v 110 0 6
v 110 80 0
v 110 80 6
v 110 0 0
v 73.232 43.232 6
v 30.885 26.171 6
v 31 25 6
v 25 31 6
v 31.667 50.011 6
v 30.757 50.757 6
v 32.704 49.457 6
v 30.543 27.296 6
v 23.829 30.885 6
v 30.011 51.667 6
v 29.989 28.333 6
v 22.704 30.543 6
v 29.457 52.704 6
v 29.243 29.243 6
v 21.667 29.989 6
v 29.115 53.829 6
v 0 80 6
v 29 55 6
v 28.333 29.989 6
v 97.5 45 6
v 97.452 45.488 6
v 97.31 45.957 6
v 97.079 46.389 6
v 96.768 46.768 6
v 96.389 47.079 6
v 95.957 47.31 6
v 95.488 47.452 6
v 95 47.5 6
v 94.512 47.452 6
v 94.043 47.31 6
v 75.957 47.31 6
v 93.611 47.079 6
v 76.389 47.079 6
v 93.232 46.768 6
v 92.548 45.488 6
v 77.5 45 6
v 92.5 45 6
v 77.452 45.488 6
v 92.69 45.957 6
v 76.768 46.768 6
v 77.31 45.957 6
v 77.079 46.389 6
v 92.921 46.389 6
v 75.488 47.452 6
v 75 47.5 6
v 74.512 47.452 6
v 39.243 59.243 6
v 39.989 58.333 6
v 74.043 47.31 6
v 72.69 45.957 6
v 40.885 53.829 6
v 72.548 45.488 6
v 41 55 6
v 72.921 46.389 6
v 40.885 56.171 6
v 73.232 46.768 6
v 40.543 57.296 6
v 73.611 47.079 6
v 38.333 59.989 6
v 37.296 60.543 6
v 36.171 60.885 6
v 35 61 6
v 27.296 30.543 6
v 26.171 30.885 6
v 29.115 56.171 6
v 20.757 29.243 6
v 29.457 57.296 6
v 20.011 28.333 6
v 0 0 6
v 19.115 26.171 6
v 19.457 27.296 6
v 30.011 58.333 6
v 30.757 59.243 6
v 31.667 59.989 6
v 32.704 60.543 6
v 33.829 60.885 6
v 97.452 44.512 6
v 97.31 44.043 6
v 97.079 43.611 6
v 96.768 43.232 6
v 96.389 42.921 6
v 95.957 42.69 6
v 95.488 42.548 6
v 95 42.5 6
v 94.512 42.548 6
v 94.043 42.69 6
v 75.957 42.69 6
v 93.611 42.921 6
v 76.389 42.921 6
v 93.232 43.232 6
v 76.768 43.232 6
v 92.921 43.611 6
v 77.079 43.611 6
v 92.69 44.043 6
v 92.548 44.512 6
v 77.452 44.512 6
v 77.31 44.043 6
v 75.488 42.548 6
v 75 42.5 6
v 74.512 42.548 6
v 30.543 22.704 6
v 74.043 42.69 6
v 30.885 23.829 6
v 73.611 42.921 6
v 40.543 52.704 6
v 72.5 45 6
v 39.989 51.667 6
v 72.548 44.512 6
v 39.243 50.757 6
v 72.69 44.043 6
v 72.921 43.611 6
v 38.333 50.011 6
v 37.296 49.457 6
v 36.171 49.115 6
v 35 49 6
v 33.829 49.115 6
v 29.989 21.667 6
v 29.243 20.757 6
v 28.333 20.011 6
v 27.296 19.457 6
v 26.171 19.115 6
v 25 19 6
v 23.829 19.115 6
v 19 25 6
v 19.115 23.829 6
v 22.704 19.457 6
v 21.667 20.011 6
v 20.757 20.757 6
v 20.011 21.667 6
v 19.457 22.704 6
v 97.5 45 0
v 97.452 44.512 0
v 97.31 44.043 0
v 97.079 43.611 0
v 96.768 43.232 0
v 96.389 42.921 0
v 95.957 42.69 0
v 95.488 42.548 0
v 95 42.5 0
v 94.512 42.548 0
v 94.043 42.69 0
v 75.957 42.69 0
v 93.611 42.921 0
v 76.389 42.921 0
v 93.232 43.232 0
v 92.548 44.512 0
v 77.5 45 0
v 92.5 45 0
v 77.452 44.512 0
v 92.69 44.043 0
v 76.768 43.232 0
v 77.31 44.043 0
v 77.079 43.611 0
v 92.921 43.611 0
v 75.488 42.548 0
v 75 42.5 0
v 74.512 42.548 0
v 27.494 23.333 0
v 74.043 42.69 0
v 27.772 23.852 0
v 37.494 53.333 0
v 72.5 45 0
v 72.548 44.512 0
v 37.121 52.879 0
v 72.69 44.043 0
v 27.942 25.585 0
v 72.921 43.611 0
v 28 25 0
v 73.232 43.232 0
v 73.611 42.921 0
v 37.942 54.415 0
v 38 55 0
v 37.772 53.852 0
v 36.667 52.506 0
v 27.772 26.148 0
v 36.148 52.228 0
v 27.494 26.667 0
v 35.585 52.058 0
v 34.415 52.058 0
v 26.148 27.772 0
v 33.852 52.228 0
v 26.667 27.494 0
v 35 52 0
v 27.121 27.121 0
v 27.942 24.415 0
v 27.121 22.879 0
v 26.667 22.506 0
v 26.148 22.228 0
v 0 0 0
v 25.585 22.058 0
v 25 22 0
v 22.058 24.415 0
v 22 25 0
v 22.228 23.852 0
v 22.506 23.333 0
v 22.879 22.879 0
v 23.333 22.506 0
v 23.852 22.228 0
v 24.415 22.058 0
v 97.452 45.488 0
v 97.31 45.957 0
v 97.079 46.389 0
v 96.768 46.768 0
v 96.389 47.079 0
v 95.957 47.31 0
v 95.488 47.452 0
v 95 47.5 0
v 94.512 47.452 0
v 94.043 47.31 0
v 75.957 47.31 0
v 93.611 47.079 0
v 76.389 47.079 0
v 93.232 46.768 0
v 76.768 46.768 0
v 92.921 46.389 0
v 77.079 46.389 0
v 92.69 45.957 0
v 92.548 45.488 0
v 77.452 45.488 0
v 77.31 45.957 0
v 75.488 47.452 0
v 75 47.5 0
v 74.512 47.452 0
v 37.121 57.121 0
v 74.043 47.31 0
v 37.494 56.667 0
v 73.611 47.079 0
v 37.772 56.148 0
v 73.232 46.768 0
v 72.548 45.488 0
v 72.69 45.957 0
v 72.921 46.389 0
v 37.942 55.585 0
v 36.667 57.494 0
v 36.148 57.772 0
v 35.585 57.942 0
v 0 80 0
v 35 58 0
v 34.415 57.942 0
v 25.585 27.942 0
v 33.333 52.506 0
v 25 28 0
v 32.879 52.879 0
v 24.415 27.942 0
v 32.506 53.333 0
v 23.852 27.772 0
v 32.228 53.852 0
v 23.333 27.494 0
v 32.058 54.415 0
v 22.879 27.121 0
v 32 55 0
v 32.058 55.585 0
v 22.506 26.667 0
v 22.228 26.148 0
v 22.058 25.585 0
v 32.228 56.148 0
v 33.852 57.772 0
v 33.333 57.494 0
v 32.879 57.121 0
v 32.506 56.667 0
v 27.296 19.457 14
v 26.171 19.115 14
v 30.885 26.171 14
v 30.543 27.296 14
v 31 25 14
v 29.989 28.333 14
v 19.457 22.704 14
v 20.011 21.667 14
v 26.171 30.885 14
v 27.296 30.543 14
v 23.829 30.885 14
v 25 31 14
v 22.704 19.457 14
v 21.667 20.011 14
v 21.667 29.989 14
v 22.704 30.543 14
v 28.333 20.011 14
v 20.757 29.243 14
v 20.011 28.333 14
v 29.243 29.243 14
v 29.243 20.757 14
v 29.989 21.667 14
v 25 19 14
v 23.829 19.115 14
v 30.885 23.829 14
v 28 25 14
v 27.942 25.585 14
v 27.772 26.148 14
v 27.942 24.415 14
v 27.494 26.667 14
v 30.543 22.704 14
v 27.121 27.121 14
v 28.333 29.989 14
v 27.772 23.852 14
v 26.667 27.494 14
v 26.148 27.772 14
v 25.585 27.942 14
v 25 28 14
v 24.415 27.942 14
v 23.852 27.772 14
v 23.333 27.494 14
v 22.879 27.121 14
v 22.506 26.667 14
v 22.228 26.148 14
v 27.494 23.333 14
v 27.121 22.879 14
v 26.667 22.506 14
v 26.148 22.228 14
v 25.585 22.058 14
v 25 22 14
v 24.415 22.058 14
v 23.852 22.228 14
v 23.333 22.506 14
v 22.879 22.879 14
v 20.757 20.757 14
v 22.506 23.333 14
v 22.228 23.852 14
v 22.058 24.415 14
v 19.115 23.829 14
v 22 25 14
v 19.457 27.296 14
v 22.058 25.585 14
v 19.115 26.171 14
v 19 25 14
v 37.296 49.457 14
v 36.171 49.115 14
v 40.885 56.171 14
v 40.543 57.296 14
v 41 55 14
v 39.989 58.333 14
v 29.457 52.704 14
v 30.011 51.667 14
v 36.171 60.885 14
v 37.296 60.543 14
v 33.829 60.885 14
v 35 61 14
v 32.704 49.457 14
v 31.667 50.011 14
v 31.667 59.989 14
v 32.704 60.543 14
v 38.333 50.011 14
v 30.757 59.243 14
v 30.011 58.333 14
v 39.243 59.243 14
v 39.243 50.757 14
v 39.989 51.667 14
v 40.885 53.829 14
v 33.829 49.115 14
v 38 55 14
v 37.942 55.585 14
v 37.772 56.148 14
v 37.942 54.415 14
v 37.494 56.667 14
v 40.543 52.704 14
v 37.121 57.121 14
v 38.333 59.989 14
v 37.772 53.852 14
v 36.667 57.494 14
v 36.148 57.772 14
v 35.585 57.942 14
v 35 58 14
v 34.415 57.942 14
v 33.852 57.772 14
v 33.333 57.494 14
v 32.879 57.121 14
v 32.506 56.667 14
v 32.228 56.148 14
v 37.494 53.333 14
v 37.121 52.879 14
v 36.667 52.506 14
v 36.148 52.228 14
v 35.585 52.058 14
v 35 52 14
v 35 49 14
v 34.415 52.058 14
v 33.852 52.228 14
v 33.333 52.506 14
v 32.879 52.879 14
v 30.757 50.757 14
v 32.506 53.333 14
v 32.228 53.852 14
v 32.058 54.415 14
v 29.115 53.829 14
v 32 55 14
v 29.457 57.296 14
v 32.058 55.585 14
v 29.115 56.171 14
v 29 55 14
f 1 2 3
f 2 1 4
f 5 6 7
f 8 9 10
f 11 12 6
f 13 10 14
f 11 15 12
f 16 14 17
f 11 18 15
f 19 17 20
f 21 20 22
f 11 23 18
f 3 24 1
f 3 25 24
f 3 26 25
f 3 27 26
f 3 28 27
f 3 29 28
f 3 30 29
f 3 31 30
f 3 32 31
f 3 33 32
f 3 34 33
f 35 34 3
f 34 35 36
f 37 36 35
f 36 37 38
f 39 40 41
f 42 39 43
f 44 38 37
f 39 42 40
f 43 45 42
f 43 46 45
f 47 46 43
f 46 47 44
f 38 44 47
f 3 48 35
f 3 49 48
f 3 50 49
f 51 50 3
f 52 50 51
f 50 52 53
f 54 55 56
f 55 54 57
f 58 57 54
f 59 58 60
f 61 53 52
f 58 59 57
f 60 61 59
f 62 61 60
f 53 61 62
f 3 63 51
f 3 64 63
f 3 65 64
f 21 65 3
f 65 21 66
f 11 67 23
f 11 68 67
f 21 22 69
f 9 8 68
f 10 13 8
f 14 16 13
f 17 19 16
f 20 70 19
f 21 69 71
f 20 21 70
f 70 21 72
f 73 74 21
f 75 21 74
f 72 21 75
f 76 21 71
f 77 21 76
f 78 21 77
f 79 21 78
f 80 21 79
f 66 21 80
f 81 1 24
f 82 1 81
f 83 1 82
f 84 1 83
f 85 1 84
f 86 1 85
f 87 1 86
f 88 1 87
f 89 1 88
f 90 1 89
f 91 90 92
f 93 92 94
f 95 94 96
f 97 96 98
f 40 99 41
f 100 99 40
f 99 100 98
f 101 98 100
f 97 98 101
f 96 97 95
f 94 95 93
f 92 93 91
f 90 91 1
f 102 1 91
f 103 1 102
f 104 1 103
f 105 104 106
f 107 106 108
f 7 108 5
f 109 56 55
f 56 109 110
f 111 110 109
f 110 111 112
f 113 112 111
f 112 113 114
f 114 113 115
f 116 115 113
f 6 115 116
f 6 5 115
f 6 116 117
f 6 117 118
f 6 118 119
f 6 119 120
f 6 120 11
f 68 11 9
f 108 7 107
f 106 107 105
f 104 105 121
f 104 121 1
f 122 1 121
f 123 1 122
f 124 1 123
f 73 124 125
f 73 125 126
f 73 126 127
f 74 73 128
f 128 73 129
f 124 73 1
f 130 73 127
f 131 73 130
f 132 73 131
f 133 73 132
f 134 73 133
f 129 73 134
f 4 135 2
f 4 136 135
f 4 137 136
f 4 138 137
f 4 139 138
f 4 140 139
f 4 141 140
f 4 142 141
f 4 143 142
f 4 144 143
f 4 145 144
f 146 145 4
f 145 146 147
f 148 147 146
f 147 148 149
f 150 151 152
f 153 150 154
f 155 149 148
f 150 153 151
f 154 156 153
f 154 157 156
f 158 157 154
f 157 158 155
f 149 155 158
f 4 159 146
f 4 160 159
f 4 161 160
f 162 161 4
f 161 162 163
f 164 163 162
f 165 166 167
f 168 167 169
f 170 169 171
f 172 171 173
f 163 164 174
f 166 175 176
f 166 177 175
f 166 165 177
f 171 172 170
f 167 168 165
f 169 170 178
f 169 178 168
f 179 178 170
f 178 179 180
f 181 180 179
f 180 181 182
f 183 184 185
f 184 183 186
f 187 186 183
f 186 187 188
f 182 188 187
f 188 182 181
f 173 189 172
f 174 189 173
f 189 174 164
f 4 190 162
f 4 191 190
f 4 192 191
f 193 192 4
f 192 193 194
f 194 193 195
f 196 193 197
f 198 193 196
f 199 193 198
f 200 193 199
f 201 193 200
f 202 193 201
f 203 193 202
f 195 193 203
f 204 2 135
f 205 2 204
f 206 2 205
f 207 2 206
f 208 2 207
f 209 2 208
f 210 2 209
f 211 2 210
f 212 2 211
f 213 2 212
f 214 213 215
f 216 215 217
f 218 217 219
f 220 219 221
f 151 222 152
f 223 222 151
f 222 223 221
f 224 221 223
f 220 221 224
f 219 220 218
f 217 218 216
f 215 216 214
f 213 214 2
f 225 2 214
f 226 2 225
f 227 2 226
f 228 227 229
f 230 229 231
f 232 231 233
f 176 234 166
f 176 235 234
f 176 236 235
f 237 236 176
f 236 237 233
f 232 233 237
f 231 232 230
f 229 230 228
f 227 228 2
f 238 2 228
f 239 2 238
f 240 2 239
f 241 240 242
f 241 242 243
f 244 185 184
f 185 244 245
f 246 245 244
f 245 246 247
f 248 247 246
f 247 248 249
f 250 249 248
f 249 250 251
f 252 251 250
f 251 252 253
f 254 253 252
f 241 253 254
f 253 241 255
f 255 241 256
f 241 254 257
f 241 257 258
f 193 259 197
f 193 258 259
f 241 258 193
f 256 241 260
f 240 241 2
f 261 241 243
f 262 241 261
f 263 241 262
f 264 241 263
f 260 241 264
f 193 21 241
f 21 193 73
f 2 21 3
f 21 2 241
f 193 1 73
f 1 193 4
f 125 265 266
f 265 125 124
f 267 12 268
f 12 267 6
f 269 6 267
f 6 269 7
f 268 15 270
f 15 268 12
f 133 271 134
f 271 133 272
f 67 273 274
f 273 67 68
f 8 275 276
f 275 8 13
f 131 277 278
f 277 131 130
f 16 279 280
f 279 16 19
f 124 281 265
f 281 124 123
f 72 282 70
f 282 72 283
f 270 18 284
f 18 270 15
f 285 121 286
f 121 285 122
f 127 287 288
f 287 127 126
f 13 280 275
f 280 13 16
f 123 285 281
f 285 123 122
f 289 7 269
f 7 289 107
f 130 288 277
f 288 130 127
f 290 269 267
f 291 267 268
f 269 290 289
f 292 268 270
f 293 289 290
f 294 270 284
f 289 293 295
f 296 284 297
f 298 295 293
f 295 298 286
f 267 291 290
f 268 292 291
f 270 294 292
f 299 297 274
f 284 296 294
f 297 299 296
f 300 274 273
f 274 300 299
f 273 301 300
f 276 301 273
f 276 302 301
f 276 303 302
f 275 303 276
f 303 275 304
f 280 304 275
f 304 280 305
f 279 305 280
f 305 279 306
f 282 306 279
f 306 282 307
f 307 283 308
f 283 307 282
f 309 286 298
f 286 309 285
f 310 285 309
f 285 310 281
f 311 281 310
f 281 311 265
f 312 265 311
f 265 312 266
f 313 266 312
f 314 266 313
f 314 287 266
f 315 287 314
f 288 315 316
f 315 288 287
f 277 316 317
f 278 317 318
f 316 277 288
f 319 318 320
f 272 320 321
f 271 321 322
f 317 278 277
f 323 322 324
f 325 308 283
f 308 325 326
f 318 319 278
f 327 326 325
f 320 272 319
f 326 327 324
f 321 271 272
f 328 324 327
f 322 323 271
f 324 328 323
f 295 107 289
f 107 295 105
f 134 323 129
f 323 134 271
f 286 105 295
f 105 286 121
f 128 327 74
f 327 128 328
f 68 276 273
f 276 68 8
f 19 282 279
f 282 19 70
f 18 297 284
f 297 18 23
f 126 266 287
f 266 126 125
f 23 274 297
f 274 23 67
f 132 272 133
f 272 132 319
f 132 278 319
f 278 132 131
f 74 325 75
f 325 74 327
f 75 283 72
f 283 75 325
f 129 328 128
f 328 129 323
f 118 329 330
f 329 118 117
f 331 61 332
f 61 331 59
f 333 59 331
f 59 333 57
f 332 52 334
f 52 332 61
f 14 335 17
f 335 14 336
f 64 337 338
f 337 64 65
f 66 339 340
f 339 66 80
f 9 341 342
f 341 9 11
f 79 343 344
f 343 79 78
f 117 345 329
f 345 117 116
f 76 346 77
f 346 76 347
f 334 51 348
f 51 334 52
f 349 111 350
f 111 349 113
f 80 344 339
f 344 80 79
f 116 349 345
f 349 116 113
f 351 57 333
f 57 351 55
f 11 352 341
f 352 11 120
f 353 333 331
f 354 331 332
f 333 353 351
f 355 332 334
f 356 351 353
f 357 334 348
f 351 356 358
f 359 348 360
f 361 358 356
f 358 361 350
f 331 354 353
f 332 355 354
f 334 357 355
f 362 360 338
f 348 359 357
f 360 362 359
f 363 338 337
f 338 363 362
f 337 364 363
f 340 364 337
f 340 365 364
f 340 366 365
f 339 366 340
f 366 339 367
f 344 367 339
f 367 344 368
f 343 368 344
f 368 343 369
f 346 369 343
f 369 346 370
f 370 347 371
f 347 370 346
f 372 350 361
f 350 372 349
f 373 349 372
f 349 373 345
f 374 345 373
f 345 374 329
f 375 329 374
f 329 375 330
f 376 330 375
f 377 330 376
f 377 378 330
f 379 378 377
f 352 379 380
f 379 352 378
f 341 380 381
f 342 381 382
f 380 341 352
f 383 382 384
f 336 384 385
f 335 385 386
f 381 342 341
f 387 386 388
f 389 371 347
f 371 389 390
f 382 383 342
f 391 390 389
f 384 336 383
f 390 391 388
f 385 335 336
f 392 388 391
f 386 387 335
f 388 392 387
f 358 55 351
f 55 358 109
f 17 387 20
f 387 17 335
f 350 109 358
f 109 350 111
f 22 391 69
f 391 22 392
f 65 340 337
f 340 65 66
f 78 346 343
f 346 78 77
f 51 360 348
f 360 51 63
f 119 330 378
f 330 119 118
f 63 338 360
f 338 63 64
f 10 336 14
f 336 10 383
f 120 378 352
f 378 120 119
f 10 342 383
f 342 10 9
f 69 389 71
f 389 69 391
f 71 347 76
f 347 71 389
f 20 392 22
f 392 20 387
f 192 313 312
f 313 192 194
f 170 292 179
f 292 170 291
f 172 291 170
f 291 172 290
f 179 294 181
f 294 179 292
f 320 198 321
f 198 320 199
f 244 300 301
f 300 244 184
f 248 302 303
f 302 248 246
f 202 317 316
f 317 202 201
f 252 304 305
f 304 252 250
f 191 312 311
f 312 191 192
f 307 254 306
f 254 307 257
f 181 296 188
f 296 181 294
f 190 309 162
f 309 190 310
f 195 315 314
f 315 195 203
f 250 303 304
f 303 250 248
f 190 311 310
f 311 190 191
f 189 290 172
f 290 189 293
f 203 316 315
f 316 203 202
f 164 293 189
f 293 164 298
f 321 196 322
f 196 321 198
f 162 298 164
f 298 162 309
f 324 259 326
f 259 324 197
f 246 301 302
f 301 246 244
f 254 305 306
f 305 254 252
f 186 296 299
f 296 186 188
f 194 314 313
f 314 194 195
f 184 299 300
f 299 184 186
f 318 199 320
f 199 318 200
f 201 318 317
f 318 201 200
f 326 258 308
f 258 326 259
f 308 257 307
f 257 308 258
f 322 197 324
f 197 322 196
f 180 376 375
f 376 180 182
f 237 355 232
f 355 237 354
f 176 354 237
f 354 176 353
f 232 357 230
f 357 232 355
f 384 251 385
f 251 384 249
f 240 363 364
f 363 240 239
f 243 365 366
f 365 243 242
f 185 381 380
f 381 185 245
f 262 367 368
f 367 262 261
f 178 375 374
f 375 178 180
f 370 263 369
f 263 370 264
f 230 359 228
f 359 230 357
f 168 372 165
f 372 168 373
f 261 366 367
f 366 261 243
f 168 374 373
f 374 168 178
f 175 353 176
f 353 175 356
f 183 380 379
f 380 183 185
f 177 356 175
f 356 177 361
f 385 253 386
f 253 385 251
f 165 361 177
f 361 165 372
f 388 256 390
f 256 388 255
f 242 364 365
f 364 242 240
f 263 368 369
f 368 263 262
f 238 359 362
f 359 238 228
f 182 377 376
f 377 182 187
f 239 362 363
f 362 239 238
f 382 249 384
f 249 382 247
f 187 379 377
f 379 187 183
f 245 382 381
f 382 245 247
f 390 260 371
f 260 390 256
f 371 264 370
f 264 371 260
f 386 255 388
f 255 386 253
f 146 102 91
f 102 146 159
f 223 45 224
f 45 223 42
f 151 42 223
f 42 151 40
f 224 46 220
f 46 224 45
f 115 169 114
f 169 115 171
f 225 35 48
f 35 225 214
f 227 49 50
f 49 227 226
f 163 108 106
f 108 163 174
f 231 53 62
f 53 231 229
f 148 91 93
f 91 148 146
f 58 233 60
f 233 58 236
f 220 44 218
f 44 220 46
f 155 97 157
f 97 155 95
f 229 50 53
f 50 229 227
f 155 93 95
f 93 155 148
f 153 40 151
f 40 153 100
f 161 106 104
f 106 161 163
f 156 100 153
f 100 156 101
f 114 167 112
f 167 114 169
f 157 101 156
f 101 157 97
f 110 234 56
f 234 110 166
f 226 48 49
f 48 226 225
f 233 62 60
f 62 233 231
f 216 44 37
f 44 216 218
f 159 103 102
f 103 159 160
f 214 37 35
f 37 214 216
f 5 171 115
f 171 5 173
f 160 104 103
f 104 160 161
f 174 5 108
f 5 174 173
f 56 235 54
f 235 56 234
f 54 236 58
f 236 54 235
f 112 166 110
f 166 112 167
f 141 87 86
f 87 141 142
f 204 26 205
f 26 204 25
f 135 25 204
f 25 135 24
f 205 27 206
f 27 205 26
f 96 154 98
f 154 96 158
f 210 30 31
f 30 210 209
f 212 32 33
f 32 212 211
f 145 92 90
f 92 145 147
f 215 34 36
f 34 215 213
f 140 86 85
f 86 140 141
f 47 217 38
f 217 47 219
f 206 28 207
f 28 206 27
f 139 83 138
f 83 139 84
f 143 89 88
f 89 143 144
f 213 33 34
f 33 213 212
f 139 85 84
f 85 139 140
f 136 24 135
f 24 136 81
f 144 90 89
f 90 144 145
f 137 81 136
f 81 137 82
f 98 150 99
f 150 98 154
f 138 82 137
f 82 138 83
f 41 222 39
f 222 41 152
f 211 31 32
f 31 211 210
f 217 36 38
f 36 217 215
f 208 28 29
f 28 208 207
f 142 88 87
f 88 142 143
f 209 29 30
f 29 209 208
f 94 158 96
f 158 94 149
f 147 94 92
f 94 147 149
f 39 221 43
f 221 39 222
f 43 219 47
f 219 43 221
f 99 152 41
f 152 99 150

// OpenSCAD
$fn = 32;

// ----------------------------------------------------------------------
// Mixed field: bosses and holes at given coordinates
// ----------------------------------------------------------------------

// --- parameters (mm) ---
plate_l = 110;            // plate length, X
plate_w = 80;             // plate width, Y
plate_t = 6;              // plate thickness, Z
boss_d = 12;              // boss diameter
boss_h = 8;               // boss height above the plate
hole_d = 5;               // through hole diameter

total_h = plate_t + boss_h;  // overall height

difference() {
  union() {
    cube([plate_l, plate_w, plate_t]);
    translate([25, 25, plate_t]) cylinder(h = boss_h, d = boss_d);
    translate([35, 55, plate_t]) cylinder(h = boss_h, d = boss_d);
  }
  translate([25, 25, -1]) cylinder(h = total_h + 2, d = boss_d / 2);
  translate([35, 55, -1]) cylinder(h = total_h + 2, d = boss_d / 2);
  translate([75, 45, -1]) cylinder(h = plate_t + 2, d = hole_d);
  translate([95, 45, -1]) cylinder(h = plate_t + 2, d = hole_d);
}
